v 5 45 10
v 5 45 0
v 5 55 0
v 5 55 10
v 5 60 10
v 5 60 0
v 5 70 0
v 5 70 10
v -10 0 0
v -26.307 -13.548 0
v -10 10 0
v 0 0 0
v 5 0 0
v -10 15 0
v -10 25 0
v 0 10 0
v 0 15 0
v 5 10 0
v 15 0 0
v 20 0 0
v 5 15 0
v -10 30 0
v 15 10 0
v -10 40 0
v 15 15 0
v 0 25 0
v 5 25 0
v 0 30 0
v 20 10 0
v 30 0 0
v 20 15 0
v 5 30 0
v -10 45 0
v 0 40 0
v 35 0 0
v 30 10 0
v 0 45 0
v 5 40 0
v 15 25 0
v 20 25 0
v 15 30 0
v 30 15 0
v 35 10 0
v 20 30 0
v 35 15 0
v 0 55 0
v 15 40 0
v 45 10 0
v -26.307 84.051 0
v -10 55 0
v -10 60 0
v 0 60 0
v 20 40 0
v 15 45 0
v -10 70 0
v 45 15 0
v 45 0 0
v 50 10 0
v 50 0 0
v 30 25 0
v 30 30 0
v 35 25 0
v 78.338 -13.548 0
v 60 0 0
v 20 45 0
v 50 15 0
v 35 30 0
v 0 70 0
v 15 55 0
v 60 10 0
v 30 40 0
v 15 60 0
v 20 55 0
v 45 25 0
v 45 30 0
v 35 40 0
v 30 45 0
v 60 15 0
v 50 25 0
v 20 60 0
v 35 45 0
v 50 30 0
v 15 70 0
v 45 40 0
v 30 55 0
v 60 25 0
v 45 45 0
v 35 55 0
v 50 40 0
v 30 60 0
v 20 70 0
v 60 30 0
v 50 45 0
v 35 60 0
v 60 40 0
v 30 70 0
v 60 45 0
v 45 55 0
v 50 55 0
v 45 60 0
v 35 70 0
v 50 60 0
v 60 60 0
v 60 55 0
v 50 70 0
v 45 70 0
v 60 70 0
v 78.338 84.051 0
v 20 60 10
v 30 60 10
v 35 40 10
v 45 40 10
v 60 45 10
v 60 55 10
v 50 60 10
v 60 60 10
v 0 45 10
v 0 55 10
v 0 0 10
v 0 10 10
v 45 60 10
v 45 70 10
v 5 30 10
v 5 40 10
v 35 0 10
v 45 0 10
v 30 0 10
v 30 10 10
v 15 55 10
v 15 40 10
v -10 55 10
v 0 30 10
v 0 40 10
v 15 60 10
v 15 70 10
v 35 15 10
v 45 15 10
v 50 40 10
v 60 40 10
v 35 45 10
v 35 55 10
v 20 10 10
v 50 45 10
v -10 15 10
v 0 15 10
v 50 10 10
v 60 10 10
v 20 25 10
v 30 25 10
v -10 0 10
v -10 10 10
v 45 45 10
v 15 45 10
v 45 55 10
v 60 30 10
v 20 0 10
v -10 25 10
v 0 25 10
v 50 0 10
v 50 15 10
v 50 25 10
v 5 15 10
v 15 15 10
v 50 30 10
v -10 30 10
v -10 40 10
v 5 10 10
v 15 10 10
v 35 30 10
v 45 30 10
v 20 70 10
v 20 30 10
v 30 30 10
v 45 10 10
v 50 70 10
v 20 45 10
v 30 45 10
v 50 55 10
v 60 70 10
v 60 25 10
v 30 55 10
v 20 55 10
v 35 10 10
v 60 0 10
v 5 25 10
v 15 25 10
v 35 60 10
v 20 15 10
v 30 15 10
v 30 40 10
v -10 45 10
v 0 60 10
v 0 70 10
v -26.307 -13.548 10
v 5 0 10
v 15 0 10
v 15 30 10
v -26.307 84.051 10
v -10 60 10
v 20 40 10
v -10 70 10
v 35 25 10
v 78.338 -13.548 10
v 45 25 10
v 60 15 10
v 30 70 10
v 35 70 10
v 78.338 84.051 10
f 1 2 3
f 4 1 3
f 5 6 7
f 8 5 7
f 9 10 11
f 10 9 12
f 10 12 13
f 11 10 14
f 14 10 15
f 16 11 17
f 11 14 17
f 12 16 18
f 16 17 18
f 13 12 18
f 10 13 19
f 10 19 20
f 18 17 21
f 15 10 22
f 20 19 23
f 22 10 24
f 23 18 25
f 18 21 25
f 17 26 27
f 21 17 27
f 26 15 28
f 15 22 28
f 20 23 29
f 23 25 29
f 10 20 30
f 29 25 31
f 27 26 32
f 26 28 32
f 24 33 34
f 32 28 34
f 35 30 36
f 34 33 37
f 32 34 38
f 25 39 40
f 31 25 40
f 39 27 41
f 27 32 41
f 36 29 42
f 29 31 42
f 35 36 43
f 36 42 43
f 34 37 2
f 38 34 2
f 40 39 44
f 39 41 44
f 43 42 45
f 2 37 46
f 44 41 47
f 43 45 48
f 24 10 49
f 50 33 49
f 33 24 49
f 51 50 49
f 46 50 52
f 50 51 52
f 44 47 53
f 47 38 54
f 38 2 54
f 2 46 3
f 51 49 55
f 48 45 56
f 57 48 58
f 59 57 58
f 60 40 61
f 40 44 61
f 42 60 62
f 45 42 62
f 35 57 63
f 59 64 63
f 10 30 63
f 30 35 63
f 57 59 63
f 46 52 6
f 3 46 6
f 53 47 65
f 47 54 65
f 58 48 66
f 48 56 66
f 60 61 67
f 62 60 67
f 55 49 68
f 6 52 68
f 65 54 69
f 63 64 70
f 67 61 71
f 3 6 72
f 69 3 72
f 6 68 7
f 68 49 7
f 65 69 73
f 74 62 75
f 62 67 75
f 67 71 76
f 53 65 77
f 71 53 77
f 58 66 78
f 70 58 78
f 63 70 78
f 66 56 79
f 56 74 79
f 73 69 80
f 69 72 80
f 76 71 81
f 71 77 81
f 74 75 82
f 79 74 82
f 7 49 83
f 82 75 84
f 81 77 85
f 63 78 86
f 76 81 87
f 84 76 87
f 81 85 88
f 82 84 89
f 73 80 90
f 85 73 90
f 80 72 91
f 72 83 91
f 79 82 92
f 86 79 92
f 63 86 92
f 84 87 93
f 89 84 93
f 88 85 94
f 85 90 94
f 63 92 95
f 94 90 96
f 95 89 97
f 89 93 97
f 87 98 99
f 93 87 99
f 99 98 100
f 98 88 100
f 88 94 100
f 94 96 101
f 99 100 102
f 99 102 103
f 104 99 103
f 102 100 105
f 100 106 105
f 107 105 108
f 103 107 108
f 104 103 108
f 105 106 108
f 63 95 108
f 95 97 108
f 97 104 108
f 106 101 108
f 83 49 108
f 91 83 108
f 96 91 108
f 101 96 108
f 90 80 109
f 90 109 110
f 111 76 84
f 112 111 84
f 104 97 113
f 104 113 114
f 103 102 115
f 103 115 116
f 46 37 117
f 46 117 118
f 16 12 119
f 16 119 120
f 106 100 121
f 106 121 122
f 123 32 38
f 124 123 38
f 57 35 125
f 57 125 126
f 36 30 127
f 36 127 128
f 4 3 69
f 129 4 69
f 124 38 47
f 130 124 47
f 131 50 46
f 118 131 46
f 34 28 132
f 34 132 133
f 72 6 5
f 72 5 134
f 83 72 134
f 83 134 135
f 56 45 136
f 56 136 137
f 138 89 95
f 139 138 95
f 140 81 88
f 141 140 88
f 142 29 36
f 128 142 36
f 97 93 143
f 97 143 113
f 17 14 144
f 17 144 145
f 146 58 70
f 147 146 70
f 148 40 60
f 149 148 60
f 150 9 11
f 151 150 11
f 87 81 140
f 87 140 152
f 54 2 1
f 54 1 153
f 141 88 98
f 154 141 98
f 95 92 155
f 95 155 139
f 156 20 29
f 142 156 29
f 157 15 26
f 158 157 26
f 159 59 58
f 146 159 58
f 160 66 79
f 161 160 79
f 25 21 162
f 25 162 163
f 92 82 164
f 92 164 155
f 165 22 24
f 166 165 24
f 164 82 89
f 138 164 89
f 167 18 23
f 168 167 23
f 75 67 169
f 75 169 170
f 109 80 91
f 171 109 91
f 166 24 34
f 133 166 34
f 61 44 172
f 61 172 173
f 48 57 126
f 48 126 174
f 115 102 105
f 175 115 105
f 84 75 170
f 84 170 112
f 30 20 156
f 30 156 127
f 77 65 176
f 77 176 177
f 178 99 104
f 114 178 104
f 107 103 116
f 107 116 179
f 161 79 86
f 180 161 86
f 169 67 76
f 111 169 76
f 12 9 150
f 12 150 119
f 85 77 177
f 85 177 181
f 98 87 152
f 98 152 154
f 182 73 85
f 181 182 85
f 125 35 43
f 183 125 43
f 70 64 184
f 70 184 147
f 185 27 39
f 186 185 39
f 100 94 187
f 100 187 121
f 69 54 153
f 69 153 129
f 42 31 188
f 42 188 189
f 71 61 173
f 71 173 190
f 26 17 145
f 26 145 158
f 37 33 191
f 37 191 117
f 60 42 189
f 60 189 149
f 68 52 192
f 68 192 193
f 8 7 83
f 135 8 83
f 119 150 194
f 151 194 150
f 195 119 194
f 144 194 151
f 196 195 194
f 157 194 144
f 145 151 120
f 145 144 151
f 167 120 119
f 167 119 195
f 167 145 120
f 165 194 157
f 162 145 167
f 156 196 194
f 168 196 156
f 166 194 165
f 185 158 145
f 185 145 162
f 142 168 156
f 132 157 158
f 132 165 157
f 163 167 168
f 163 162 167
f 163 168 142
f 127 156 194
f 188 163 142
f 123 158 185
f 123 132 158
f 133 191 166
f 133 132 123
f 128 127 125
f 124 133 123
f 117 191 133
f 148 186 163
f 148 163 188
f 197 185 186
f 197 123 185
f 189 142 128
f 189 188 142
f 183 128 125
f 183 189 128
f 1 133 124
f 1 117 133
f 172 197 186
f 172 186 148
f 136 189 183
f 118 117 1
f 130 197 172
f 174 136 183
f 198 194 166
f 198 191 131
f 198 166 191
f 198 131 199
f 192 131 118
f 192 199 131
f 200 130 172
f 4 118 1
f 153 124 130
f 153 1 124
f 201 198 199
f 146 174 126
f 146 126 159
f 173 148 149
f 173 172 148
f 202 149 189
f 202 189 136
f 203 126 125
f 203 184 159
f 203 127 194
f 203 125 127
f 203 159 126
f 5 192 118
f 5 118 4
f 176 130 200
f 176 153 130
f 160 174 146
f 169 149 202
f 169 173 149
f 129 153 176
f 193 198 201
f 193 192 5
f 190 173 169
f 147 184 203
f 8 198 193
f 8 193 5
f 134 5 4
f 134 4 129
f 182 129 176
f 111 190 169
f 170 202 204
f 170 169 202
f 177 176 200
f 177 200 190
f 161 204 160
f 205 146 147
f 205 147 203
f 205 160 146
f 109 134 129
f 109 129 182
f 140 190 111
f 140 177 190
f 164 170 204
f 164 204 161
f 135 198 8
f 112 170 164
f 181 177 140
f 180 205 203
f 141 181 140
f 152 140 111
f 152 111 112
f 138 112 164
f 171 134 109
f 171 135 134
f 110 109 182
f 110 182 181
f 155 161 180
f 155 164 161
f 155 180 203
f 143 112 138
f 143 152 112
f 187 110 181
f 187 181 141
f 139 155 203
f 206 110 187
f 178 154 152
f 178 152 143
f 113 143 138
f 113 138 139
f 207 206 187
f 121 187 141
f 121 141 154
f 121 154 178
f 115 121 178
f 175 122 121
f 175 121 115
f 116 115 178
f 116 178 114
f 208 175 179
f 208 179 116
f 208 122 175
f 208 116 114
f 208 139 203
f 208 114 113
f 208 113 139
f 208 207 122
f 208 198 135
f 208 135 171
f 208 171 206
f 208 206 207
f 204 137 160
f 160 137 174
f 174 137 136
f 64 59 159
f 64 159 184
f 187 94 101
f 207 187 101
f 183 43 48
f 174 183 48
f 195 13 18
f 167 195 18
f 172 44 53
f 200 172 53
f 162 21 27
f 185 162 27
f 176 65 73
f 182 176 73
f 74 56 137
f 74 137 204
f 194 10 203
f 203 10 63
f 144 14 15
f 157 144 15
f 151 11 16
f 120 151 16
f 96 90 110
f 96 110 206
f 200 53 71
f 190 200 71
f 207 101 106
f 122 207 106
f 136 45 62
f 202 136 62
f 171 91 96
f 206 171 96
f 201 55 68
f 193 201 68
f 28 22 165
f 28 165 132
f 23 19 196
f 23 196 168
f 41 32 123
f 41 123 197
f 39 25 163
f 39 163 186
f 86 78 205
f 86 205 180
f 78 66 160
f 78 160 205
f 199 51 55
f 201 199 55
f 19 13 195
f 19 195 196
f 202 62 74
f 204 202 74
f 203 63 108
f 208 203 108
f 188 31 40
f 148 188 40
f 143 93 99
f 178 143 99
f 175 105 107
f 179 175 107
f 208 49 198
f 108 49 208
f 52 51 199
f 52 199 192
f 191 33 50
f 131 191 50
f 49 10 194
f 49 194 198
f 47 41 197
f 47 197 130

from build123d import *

# Parameters (mm, degrees)
F1_W     = 104.644717
F1_H     = 97.599118
F2_DEPTH = 10
F0_W     = 10
F0_H     = 10
F3_DEPTH = 25


with BuildPart() as f2:
    # F1 (on Top) → F2 (new body)
    with BuildSketch(Plane.XY):
        with Locations((26.015675, 35.25167)):
            Rectangle(F1_W, F1_H)
    extrude(amount=F2_DEPTH)

    # F0 (on Top) → F3 (cut)
    with BuildSketch(Plane.XY):
        with Locations((-5, 5)):
            Rectangle(F0_W, F0_H)
        with Locations((-5, 20)):
            Rectangle(F0_W, F0_H)
        with Locations((-5, 35)):
            Rectangle(F0_W, F0_H)
        with Locations((-5, 50)):
            Rectangle(F0_W, F0_H)
        with Locations((-5, 65)):
            Rectangle(F0_W, F0_H)
        with Locations((10, 5)):
            Rectangle(F0_W, F0_H)
        with Locations((10, 20)):
            Rectangle(F0_W, F0_H)
        with Locations((10, 35)):
            Rectangle(F0_W, F0_H)
        with Locations((10, 50)):
            Rectangle(F0_W, F0_H)
        with Locations((10, 65)):
            Rectangle(F0_W, F0_H)
        with Locations((25, 5)):
            Rectangle(F0_W, F0_H)
        with Locations((25, 20)):
            Rectangle(F0_W, F0_H)
        with Locations((25, 35)):
            Rectangle(F0_W, F0_H)
        with Locations((25, 50)):
            Rectangle(F0_W, F0_H)
        with Locations((25, 65)):
            Rectangle(F0_W, F0_H)
        with Locations((40, 5)):
            Rectangle(F0_W, F0_H)
        with Locations((40, 20)):
            Rectangle(F0_W, F0_H)
        with Locations((40, 35)):
            Rectangle(F0_W, F0_H)
        with Locations((40, 50)):
            Rectangle(F0_W, F0_H)
        with Locations((40, 65)):
            Rectangle(F0_W, F0_H)
        with Locations((55, 5)):
            Rectangle(F0_W, F0_H)
        with Locations((55, 20)):
            Rectangle(F0_W, F0_H)
        with Locations((55, 35)):
            Rectangle(F0_W, F0_H)
        with Locations((55, 50)):
            Rectangle(F0_W, F0_H)
        with Locations((55, 65)):
            Rectangle(F0_W, F0_H)
    extrude(amount=F3_DEPTH, mode=Mode.SUBTRACT)


solid = f2.part
